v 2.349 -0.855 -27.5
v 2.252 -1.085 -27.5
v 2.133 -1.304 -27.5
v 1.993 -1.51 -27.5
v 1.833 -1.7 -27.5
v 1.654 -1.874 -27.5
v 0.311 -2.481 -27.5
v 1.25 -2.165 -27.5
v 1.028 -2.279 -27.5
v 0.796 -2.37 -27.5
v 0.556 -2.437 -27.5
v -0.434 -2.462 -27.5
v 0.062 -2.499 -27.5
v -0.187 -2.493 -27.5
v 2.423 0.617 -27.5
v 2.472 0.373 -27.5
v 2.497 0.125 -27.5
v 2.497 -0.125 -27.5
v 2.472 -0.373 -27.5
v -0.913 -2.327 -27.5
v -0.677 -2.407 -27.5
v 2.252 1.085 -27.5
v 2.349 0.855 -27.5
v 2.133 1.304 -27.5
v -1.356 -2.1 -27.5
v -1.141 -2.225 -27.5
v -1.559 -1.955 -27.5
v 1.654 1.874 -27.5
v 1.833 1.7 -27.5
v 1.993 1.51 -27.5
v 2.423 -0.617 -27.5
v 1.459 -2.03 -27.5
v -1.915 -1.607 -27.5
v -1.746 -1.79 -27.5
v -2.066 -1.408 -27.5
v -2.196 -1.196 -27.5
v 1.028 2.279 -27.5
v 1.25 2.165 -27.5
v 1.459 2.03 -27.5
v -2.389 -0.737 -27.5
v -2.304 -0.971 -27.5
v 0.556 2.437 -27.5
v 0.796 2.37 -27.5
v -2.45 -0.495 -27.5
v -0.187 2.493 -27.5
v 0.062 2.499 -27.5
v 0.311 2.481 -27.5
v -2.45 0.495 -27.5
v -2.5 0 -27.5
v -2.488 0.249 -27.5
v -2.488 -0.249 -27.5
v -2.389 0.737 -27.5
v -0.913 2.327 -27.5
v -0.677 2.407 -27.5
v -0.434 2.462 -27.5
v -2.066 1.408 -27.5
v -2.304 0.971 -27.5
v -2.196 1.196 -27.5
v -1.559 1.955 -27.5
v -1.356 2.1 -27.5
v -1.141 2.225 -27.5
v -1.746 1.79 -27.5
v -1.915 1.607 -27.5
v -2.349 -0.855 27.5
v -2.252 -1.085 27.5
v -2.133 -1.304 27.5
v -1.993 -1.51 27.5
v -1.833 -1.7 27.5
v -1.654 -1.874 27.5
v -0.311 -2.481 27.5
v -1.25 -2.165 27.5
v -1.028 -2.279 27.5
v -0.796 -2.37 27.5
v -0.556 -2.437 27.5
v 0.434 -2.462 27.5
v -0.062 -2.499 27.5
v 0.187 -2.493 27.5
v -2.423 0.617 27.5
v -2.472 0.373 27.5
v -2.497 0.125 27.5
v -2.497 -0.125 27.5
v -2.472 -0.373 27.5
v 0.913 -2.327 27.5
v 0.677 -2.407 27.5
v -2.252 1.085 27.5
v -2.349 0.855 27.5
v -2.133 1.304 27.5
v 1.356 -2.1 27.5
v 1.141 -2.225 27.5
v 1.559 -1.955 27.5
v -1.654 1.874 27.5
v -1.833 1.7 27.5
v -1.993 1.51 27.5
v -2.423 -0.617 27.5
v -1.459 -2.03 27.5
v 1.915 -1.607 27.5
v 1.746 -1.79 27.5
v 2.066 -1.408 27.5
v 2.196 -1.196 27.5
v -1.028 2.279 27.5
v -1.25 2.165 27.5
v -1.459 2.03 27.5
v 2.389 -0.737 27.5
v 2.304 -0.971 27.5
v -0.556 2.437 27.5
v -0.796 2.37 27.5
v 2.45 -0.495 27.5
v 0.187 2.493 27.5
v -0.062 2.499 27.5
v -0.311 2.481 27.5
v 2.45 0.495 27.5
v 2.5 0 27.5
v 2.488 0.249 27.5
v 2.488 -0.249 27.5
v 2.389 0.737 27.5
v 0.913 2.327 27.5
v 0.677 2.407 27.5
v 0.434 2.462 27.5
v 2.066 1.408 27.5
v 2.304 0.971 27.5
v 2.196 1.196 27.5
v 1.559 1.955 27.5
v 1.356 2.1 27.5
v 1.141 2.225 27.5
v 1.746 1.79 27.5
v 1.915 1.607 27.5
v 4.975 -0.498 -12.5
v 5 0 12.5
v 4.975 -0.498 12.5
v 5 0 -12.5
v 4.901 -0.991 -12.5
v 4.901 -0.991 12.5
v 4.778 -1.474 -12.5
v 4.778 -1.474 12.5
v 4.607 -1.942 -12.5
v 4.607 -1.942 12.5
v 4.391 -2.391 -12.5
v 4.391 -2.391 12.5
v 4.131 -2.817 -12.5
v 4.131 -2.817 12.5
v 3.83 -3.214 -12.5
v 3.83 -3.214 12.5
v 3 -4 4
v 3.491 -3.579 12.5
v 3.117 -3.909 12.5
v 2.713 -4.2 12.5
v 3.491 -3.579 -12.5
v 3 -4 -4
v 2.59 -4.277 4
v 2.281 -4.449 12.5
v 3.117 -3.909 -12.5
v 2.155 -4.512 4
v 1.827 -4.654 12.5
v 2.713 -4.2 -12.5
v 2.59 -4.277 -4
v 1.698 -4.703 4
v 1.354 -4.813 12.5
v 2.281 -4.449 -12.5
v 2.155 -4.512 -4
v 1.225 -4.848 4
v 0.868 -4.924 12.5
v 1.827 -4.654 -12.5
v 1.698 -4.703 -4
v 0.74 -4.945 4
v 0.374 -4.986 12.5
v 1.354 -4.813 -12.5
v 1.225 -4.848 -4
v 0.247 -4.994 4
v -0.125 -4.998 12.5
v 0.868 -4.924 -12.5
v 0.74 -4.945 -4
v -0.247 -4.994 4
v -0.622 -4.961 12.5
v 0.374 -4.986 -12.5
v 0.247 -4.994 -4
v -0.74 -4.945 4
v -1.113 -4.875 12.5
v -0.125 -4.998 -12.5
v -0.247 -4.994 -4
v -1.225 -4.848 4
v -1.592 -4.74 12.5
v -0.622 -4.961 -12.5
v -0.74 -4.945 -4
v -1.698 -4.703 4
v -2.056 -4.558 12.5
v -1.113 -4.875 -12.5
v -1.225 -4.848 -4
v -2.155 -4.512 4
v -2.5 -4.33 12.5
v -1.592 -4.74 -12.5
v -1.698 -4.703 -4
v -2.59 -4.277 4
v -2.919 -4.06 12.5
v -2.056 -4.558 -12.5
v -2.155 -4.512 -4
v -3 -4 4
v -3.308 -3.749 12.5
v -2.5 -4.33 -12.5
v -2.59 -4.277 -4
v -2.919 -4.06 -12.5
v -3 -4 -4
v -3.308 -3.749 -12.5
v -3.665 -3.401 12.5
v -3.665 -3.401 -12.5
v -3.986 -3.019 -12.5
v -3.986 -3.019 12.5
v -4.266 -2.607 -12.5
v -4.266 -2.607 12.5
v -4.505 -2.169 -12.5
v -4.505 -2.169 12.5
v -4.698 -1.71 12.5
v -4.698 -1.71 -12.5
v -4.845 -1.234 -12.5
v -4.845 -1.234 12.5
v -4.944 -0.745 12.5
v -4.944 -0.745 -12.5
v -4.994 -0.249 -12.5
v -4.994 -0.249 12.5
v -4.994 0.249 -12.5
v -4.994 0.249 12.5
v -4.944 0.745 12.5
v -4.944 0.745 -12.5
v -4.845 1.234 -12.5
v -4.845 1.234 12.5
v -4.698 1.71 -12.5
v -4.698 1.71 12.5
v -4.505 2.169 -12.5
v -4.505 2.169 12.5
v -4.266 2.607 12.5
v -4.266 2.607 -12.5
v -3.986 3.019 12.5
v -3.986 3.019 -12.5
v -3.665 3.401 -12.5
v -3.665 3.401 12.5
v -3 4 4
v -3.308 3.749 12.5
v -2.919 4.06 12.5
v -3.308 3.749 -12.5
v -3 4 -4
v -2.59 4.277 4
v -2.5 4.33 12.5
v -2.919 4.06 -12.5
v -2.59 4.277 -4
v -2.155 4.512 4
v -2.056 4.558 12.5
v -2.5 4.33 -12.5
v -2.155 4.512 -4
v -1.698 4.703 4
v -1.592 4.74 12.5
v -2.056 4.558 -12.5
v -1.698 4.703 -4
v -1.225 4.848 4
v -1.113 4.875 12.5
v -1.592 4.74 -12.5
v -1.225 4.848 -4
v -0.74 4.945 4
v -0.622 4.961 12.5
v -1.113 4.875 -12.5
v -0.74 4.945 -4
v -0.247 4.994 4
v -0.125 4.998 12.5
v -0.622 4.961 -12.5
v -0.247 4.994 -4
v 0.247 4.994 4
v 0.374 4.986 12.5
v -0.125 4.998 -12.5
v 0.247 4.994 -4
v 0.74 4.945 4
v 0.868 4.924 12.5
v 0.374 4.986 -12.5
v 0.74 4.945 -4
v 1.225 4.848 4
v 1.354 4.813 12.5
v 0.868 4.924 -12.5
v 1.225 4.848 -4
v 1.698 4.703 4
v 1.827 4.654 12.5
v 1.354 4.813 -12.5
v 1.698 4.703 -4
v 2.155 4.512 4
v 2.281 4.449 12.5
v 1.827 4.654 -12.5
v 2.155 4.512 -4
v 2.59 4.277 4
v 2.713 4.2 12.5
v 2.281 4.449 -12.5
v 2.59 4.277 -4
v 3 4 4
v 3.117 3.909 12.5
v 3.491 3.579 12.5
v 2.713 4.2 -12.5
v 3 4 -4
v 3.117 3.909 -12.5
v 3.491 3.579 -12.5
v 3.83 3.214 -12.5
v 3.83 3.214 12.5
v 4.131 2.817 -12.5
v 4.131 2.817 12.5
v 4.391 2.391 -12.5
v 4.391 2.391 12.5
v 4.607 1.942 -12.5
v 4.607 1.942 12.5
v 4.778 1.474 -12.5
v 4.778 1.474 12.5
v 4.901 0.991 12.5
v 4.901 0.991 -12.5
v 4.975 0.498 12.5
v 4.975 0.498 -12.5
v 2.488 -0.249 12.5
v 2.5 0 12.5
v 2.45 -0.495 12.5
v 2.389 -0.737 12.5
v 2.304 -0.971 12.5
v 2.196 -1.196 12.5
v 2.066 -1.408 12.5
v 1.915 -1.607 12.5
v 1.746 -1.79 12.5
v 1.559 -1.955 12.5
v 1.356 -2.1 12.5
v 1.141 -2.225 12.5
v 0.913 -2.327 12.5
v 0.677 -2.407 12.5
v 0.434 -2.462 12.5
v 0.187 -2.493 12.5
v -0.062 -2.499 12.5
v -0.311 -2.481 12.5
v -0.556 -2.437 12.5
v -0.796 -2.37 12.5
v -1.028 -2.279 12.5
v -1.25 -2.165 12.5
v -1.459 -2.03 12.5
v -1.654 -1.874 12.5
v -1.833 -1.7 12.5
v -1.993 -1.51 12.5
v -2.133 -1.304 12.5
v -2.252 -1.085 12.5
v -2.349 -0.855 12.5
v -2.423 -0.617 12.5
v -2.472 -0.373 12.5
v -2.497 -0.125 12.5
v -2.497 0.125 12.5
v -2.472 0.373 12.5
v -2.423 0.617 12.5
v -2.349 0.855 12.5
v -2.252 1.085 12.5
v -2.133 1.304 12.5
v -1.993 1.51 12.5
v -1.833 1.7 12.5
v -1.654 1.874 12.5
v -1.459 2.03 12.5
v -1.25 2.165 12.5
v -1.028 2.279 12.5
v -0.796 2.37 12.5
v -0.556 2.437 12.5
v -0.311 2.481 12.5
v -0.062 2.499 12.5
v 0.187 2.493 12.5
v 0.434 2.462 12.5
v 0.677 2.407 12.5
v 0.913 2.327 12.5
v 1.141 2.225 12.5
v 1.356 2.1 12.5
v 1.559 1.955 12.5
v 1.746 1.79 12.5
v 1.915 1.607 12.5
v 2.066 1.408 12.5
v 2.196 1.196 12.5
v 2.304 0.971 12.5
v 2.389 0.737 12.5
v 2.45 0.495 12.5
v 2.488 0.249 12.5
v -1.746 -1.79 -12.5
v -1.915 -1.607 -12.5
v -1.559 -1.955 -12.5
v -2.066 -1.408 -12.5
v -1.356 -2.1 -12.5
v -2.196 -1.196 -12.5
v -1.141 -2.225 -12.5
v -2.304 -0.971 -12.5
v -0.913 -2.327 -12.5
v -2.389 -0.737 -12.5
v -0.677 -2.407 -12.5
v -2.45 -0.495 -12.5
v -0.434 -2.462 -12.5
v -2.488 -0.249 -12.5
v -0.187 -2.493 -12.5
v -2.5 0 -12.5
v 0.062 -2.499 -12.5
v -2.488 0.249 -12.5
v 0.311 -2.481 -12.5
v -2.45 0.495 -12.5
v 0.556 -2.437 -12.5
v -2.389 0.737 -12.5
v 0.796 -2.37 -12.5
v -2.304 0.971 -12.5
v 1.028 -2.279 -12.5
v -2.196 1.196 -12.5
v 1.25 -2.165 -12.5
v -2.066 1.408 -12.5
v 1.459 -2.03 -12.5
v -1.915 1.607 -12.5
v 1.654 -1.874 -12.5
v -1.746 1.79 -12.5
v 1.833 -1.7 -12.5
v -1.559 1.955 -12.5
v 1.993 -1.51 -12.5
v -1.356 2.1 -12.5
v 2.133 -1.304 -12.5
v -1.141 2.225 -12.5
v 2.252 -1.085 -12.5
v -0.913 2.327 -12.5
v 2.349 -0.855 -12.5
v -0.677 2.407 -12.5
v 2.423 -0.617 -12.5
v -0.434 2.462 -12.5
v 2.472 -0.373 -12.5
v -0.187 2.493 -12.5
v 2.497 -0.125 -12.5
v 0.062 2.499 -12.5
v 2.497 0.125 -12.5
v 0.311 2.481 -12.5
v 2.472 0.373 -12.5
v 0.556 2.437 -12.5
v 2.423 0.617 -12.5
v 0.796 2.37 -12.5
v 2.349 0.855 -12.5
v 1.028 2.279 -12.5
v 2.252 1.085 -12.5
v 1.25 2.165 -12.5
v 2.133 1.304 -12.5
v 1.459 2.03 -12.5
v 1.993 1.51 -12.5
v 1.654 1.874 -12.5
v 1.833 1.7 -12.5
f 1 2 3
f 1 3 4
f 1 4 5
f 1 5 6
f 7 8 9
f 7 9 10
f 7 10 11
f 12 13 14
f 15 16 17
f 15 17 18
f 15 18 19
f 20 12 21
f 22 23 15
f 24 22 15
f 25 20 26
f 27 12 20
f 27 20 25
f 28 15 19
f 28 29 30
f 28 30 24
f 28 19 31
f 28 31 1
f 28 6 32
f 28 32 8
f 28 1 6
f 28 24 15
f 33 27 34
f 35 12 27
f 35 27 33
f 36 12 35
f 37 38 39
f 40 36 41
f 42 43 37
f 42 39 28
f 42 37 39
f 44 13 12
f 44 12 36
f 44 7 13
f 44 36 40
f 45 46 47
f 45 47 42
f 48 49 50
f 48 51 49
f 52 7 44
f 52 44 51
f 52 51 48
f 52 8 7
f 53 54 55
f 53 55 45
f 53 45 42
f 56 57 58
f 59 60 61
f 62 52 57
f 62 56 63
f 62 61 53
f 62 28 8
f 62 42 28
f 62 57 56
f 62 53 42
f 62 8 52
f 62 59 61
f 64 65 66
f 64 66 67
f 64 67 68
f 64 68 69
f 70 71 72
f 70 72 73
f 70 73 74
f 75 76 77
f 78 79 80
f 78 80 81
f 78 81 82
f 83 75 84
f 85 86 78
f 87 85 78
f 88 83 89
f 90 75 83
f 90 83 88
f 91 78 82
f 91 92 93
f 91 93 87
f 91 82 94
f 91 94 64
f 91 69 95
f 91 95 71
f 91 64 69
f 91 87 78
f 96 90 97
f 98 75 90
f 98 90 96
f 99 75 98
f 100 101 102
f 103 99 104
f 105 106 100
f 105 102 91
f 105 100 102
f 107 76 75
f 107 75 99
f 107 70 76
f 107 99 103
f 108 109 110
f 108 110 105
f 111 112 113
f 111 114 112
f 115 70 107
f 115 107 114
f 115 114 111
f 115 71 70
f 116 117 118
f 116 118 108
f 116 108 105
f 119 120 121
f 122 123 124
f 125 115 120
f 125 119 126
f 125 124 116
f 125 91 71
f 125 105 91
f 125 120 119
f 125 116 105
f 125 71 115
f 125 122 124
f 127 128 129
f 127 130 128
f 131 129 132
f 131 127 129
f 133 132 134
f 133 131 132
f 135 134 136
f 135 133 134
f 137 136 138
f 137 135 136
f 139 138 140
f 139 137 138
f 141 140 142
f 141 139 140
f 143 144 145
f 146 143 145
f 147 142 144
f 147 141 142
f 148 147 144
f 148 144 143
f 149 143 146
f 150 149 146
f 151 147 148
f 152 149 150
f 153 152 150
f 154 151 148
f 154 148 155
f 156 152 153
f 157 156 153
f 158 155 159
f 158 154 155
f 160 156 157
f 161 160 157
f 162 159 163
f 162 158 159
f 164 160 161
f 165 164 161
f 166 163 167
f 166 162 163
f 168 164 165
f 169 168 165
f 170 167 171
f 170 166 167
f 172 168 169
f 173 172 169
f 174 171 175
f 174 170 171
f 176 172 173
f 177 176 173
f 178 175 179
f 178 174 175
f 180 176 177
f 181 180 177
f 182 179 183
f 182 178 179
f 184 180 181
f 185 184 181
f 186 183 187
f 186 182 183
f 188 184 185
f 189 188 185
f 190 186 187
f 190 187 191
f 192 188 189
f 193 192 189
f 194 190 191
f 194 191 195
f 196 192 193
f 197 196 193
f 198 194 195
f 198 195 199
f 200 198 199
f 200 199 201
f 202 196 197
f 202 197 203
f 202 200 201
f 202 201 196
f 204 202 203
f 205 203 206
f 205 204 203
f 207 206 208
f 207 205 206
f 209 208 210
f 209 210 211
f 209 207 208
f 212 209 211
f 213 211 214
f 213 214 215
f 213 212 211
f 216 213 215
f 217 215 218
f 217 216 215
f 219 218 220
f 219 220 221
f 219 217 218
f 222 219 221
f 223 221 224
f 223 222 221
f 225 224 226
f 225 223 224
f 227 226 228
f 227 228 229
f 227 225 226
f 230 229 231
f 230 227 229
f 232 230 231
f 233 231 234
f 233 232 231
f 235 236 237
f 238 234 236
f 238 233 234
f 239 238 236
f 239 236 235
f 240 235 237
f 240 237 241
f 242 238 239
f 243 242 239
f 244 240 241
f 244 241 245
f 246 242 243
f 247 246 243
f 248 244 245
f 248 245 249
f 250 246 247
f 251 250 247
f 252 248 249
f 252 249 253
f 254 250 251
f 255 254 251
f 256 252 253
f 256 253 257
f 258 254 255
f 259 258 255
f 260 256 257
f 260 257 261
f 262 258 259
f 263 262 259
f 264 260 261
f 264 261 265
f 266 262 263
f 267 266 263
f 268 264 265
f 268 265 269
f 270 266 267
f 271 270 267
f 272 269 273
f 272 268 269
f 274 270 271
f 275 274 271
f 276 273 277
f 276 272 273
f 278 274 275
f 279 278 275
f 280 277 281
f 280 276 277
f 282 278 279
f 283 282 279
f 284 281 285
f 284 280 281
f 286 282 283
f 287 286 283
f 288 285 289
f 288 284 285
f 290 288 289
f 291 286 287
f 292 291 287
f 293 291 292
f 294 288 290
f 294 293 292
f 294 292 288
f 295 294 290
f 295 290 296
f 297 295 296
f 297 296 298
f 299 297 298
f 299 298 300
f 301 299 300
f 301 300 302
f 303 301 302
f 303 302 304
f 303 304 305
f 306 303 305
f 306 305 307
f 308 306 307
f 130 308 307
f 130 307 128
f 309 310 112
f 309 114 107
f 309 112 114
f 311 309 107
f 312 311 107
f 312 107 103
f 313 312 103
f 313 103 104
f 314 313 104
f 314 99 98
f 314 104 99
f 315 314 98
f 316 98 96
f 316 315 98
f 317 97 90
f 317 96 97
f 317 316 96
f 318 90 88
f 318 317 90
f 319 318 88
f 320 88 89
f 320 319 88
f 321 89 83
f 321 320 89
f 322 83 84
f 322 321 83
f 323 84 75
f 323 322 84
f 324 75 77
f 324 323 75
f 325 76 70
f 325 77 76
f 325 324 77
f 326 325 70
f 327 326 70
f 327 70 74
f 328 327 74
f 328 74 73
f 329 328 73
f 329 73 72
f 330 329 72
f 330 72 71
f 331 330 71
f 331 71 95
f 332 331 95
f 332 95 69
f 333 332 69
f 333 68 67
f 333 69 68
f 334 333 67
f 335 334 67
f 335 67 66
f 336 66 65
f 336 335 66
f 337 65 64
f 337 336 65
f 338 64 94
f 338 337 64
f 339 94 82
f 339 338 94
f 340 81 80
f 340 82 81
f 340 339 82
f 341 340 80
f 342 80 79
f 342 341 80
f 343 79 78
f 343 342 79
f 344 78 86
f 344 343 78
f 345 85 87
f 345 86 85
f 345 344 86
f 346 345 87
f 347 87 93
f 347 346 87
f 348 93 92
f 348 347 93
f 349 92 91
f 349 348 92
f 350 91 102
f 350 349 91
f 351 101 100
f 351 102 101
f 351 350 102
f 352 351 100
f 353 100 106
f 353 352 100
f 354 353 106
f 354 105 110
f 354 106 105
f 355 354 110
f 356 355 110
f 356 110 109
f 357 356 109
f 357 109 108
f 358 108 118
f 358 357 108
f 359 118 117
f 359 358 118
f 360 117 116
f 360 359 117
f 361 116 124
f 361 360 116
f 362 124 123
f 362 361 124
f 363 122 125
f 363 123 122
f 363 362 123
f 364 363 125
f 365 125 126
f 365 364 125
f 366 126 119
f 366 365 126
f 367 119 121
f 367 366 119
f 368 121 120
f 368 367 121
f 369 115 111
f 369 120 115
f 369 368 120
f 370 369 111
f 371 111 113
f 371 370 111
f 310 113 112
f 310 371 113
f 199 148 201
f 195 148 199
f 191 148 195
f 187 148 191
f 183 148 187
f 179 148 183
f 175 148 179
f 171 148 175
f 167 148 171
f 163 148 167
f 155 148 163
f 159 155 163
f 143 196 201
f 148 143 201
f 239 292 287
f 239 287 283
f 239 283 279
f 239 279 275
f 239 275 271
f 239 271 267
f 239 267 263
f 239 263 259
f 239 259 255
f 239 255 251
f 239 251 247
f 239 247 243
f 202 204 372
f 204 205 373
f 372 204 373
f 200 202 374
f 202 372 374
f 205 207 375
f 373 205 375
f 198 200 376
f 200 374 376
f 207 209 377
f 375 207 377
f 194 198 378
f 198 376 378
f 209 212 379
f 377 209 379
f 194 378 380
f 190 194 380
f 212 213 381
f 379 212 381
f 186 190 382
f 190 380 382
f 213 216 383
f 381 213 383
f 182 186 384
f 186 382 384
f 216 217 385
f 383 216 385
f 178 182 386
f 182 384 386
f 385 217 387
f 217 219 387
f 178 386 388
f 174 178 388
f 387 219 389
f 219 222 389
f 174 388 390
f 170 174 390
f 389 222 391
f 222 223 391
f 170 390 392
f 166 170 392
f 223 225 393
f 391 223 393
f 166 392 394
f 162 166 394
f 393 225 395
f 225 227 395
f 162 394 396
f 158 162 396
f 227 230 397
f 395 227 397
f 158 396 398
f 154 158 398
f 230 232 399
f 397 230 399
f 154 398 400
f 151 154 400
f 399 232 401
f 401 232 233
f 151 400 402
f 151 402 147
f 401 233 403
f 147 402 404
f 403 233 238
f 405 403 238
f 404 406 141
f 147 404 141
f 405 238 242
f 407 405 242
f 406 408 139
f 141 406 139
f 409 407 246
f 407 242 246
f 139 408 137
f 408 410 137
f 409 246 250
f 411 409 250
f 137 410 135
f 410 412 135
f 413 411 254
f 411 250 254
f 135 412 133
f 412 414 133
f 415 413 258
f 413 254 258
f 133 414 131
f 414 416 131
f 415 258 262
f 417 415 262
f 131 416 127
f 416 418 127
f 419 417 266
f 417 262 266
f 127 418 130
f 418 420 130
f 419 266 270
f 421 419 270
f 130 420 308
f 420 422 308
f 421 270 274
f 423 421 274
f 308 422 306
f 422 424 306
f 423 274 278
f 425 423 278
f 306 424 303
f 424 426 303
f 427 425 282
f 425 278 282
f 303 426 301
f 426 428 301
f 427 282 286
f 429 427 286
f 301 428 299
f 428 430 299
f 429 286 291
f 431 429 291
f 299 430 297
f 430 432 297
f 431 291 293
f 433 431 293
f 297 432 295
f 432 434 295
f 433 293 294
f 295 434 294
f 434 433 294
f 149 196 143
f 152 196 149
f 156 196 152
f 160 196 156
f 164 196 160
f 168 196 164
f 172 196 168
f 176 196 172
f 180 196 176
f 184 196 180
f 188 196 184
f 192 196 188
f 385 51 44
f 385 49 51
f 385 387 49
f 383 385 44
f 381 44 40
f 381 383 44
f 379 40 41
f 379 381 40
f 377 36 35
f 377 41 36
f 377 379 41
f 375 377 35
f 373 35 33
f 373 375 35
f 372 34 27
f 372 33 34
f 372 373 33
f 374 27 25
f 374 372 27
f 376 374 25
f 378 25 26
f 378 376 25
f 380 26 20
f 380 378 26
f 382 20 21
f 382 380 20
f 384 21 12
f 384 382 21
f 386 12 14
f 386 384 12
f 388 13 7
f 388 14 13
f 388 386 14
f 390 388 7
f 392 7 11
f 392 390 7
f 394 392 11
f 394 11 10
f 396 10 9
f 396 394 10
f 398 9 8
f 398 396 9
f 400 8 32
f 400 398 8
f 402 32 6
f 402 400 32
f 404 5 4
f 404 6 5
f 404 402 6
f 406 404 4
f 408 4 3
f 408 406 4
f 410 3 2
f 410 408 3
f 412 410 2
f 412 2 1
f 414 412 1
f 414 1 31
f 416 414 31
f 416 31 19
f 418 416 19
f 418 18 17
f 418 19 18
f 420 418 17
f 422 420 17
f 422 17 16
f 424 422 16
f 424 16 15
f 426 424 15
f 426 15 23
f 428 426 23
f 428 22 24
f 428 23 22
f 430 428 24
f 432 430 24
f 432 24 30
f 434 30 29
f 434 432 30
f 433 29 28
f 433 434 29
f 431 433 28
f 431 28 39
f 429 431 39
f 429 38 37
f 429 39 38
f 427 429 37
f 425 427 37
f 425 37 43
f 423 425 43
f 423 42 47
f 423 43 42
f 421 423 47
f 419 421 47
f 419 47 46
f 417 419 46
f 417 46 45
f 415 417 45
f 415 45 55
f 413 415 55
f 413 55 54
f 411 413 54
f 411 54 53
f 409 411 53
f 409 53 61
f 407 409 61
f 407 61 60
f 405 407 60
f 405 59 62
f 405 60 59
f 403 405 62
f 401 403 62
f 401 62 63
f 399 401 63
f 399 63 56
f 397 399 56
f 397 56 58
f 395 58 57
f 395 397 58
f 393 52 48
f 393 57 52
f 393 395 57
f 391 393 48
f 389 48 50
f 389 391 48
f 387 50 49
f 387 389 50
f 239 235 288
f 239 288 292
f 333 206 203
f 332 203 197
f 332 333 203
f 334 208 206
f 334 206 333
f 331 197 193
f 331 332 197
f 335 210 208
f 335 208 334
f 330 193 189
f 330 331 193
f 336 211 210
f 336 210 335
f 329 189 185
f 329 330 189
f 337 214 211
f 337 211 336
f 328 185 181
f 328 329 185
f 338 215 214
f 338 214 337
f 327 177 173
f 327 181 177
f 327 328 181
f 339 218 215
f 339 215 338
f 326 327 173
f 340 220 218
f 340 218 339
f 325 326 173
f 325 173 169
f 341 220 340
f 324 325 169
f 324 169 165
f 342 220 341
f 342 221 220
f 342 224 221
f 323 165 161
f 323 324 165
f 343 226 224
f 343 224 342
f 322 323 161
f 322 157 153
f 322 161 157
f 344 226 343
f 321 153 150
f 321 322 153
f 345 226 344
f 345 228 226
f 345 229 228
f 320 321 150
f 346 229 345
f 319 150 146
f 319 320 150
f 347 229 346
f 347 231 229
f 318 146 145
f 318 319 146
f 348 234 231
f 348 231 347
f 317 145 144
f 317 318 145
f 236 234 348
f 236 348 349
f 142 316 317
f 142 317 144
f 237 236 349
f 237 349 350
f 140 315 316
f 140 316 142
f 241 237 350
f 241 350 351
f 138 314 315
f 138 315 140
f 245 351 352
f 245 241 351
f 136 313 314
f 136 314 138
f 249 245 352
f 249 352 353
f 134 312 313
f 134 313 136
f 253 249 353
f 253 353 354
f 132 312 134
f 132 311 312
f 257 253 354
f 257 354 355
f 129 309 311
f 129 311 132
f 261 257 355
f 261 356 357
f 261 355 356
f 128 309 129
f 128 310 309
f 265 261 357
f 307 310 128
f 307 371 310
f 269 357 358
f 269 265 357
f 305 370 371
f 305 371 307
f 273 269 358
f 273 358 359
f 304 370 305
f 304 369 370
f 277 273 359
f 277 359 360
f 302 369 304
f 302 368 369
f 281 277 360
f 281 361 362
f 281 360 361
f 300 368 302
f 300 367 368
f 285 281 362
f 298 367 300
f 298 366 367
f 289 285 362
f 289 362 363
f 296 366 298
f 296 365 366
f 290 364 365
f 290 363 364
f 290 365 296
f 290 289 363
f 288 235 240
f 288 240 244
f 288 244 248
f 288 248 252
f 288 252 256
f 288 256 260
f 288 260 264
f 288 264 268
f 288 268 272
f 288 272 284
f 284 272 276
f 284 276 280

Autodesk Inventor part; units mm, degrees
ref_plane "YZ Plane" through (0, 0, 0) normal (1, 0, 0) x (0, 1, 0)
ref_plane "XZ Plane" through (0, 0, 0) normal (0, 1, 0) x (-1, 0, 0)
ref_plane "XY Plane" through (0, 0, 0) normal (0, 0, 1) x (1, 0, 0)
sketch "Skizze1" plane through (0, 0, 0) normal (0, 0, 1) x (1, 0, 0)
  line L0 (-7, 0) -> (7, 0) projected
  line L1 (0, -7) -> (0, 7) projected
  circle A0 centre (0, 0) radius 5
  dimension "d0" = 10
extrude "Extrusion1" add sketch "Skizze1" along normal mid plane 25
sketch "Skizze2" plane through (0, 0, -12.5) normal (0, 0, -1) x (-1, 0, 0)
  circle A0 centre (0, 0) radius 2.5
  dimension "d3" = 5
extrude "Extrusion2" add sketch "Skizze2" along normal blind 15
sketch "Skizze3" plane through (0, 0, 12.5) normal (0, 0, 1) x (1, 0, 0)
  circle A0 centre (0, 0) radius 2.5
  circle A1 centre (0, 0) radius 2.5 projected
extrude "Extrusion3" add sketch "Skizze3" along normal blind 15
thread "Gewinde1" size "M5x0.8" class "6g" standard "ANSI Metric M Profile" full length
sketch "Skizze4" plane through (0, 0, 0) normal (1, 0, 0) x (0, 1, 0)
  line L0 (-7, 0) -> (7, 0) projected
  line L1 (0, -5.6) -> (0, 5.6) projected
  line L2 (-7, 4) -> (-4, 4)
  line L3 (-4, 4) -> (-4, -4)
  line L4 (-4, -4) -> (-7, -4)
  line L5 (-7, -4) -> (-7, 4)
  line L6 (-7, 4) -> (-4, -4) construction
  line L7 (-4, 4) -> (-7, -4) construction
  line L8 (7, 4) -> (4, 4)
  line L9 (4, 4) -> (4, -4)
  line L10 (4, -4) -> (7, -4)
  line L11 (7, -4) -> (7, 4)
  line L12 (7, 4) -> (4, -4) construction
  line L13 (4, 4) -> (7, -4) construction
  point P0 (0, 0)
  point P1 (-5.5, 0)
  point P2 (5.5, 0)
  dimension "d10" = 8
  dimension "d11" = 8
  dimension "d12" = 3
extrude "Extrusion4" cut sketch "Skizze4" along normal mid plane 20
properties part number "24_0497_0017"
